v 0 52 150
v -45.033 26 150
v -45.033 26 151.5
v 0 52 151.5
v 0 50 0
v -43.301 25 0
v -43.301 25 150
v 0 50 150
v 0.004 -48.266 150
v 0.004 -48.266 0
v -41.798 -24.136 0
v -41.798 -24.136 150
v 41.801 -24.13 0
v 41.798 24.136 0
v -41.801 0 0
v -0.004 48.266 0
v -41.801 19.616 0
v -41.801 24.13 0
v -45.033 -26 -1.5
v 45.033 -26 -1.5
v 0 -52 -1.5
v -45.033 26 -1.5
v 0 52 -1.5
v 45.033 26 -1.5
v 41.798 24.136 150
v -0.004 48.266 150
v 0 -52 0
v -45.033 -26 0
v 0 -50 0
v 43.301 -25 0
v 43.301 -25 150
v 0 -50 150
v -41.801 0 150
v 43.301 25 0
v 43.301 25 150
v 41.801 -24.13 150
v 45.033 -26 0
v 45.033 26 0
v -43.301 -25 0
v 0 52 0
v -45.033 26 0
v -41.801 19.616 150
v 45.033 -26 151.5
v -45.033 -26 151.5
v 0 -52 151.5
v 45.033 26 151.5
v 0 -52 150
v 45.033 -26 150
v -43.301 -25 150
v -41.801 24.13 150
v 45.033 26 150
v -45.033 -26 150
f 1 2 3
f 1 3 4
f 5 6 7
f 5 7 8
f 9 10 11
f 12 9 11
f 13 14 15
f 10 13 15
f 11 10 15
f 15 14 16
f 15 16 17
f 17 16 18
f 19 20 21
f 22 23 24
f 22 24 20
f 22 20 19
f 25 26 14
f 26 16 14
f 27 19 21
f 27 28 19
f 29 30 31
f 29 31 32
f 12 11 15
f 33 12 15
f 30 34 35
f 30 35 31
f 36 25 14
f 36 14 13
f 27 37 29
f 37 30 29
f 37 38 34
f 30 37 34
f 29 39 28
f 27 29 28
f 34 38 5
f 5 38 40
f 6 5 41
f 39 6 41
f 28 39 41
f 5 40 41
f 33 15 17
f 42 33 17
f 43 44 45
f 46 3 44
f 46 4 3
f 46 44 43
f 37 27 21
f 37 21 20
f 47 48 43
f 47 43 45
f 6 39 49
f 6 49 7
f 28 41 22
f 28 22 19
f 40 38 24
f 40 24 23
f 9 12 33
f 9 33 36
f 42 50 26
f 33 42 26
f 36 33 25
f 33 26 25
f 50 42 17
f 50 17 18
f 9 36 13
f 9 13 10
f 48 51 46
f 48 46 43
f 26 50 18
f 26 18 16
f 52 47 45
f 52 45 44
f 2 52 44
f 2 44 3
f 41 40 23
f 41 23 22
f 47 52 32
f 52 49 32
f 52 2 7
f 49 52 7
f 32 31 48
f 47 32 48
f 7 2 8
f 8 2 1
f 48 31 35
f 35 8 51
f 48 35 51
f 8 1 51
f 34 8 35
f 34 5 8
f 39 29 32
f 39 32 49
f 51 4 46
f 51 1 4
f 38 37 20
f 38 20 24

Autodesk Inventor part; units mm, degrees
ref_plane "YZ Plane" through (0, 0, 0) normal (1, 0, 0) x (0, 1, 0)
ref_plane "XZ Plane" through (0, 0, 0) normal (0, 1, 0) x (-1, 0, 0)
ref_plane "XY Plane" through (0, 0, 0) normal (0, 0, 1) x (1, 0, 0)
sketch "Sketch1" plane through (0, 0, 0) normal (0, 0, 1) x (1, 0, 0)
  line L0 (0, 50) -> (43.3013, 25)
  line L1 (43.3013, 25) -> (43.3013, -25)
  line L2 (43.3013, -25) -> (0, -50)
  line L3 (0, -50) -> (-43.3013, -25)
  line L4 (-43.3013, -25) -> (-43.3013, 25)
  line L5 (-43.3013, 25) -> (0, 50)
  line L6 (-43.3013, 0) -> (-41.8013, 0)
  line L7 (-41.8013, 0) -> (-41.8013, 19.6162)
  line L8 (-41.8013, 0) -> (-41.8013, -22.4019)
  line L9 (-41.8013, 24.1299) -> (-0.0035, 48.2659)
  line L10 (-0.0035, 48.2659) -> (41.7978, 24.136)
  line L11 (41.7978, 24.136) -> (41.8013, -24.1299)
  line L12 (41.8013, -24.1299) -> (0.0035, -48.2659)
  line L13 (0.0035, -48.2659) -> (-41.7978, -24.136)
  line L14 (-41.7978, -24.136) -> (-41.8013, 24.1299)
  point P0 (0, 0)
  point P1 (41.8008, -18.0468)
  point P2 (43.3013, -18.0468)
  point P3 (41.8009, -18.3387)
  point P4 (43.3013, -18.3387)
  dimension "d0" = 50
  dimension "d11" = 1.5
  dimension "d12" = 0.004
  dimension "d13" = 1.5004
extrude "Extrusion3" add sketch "Sketch1" along normal blind 150
sketch "Sketch2" plane through (0, 0, 150) normal (0, 0, 1) x (1, 0, 0)
  line L0 (0, 0) -> (0, 52)
  line L1 (0, 52) -> (45.0333, 26)
  line L2 (45.0333, 26) -> (45.0333, -26)
  line L3 (45.0333, -26) -> (0, -52)
  line L4 (0, -52) -> (-45.0333, -26)
  line L5 (-45.0333, -26) -> (-45.0333, 26)
  line L6 (-45.0333, 26) -> (0, 52)
  dimension "d16" = 52
  dimension "d17" = 52
extrude "Extrusion4" add sketch "Sketch2" along normal blind 1.5
sketch "Sketch3" plane through (0, 0, 0) normal (0, 0, -1) x (-1, 0, 0)
  line L0 (45.0333, -26) -> (0, -52) projected
  line L1 (0, -52) -> (-45.0333, -26)
  line L2 (-45.0333, -26) -> (-45.0333, 26)
  line L3 (-45.0333, 26) -> (0, 52)
  line L4 (0, 52) -> (45.0333, 26)
  line L5 (45.0333, 26) -> (45.0333, -26)
  line L6 (45.0333, -26) -> (0, -52)
  point P0 (0, 0)
  point P1 (0, 0)
  dimension "d20" = 52
extrude "Extrusion5" add sketch "Sketch3" along normal blind 1.5
properties part number "Hexagono"
